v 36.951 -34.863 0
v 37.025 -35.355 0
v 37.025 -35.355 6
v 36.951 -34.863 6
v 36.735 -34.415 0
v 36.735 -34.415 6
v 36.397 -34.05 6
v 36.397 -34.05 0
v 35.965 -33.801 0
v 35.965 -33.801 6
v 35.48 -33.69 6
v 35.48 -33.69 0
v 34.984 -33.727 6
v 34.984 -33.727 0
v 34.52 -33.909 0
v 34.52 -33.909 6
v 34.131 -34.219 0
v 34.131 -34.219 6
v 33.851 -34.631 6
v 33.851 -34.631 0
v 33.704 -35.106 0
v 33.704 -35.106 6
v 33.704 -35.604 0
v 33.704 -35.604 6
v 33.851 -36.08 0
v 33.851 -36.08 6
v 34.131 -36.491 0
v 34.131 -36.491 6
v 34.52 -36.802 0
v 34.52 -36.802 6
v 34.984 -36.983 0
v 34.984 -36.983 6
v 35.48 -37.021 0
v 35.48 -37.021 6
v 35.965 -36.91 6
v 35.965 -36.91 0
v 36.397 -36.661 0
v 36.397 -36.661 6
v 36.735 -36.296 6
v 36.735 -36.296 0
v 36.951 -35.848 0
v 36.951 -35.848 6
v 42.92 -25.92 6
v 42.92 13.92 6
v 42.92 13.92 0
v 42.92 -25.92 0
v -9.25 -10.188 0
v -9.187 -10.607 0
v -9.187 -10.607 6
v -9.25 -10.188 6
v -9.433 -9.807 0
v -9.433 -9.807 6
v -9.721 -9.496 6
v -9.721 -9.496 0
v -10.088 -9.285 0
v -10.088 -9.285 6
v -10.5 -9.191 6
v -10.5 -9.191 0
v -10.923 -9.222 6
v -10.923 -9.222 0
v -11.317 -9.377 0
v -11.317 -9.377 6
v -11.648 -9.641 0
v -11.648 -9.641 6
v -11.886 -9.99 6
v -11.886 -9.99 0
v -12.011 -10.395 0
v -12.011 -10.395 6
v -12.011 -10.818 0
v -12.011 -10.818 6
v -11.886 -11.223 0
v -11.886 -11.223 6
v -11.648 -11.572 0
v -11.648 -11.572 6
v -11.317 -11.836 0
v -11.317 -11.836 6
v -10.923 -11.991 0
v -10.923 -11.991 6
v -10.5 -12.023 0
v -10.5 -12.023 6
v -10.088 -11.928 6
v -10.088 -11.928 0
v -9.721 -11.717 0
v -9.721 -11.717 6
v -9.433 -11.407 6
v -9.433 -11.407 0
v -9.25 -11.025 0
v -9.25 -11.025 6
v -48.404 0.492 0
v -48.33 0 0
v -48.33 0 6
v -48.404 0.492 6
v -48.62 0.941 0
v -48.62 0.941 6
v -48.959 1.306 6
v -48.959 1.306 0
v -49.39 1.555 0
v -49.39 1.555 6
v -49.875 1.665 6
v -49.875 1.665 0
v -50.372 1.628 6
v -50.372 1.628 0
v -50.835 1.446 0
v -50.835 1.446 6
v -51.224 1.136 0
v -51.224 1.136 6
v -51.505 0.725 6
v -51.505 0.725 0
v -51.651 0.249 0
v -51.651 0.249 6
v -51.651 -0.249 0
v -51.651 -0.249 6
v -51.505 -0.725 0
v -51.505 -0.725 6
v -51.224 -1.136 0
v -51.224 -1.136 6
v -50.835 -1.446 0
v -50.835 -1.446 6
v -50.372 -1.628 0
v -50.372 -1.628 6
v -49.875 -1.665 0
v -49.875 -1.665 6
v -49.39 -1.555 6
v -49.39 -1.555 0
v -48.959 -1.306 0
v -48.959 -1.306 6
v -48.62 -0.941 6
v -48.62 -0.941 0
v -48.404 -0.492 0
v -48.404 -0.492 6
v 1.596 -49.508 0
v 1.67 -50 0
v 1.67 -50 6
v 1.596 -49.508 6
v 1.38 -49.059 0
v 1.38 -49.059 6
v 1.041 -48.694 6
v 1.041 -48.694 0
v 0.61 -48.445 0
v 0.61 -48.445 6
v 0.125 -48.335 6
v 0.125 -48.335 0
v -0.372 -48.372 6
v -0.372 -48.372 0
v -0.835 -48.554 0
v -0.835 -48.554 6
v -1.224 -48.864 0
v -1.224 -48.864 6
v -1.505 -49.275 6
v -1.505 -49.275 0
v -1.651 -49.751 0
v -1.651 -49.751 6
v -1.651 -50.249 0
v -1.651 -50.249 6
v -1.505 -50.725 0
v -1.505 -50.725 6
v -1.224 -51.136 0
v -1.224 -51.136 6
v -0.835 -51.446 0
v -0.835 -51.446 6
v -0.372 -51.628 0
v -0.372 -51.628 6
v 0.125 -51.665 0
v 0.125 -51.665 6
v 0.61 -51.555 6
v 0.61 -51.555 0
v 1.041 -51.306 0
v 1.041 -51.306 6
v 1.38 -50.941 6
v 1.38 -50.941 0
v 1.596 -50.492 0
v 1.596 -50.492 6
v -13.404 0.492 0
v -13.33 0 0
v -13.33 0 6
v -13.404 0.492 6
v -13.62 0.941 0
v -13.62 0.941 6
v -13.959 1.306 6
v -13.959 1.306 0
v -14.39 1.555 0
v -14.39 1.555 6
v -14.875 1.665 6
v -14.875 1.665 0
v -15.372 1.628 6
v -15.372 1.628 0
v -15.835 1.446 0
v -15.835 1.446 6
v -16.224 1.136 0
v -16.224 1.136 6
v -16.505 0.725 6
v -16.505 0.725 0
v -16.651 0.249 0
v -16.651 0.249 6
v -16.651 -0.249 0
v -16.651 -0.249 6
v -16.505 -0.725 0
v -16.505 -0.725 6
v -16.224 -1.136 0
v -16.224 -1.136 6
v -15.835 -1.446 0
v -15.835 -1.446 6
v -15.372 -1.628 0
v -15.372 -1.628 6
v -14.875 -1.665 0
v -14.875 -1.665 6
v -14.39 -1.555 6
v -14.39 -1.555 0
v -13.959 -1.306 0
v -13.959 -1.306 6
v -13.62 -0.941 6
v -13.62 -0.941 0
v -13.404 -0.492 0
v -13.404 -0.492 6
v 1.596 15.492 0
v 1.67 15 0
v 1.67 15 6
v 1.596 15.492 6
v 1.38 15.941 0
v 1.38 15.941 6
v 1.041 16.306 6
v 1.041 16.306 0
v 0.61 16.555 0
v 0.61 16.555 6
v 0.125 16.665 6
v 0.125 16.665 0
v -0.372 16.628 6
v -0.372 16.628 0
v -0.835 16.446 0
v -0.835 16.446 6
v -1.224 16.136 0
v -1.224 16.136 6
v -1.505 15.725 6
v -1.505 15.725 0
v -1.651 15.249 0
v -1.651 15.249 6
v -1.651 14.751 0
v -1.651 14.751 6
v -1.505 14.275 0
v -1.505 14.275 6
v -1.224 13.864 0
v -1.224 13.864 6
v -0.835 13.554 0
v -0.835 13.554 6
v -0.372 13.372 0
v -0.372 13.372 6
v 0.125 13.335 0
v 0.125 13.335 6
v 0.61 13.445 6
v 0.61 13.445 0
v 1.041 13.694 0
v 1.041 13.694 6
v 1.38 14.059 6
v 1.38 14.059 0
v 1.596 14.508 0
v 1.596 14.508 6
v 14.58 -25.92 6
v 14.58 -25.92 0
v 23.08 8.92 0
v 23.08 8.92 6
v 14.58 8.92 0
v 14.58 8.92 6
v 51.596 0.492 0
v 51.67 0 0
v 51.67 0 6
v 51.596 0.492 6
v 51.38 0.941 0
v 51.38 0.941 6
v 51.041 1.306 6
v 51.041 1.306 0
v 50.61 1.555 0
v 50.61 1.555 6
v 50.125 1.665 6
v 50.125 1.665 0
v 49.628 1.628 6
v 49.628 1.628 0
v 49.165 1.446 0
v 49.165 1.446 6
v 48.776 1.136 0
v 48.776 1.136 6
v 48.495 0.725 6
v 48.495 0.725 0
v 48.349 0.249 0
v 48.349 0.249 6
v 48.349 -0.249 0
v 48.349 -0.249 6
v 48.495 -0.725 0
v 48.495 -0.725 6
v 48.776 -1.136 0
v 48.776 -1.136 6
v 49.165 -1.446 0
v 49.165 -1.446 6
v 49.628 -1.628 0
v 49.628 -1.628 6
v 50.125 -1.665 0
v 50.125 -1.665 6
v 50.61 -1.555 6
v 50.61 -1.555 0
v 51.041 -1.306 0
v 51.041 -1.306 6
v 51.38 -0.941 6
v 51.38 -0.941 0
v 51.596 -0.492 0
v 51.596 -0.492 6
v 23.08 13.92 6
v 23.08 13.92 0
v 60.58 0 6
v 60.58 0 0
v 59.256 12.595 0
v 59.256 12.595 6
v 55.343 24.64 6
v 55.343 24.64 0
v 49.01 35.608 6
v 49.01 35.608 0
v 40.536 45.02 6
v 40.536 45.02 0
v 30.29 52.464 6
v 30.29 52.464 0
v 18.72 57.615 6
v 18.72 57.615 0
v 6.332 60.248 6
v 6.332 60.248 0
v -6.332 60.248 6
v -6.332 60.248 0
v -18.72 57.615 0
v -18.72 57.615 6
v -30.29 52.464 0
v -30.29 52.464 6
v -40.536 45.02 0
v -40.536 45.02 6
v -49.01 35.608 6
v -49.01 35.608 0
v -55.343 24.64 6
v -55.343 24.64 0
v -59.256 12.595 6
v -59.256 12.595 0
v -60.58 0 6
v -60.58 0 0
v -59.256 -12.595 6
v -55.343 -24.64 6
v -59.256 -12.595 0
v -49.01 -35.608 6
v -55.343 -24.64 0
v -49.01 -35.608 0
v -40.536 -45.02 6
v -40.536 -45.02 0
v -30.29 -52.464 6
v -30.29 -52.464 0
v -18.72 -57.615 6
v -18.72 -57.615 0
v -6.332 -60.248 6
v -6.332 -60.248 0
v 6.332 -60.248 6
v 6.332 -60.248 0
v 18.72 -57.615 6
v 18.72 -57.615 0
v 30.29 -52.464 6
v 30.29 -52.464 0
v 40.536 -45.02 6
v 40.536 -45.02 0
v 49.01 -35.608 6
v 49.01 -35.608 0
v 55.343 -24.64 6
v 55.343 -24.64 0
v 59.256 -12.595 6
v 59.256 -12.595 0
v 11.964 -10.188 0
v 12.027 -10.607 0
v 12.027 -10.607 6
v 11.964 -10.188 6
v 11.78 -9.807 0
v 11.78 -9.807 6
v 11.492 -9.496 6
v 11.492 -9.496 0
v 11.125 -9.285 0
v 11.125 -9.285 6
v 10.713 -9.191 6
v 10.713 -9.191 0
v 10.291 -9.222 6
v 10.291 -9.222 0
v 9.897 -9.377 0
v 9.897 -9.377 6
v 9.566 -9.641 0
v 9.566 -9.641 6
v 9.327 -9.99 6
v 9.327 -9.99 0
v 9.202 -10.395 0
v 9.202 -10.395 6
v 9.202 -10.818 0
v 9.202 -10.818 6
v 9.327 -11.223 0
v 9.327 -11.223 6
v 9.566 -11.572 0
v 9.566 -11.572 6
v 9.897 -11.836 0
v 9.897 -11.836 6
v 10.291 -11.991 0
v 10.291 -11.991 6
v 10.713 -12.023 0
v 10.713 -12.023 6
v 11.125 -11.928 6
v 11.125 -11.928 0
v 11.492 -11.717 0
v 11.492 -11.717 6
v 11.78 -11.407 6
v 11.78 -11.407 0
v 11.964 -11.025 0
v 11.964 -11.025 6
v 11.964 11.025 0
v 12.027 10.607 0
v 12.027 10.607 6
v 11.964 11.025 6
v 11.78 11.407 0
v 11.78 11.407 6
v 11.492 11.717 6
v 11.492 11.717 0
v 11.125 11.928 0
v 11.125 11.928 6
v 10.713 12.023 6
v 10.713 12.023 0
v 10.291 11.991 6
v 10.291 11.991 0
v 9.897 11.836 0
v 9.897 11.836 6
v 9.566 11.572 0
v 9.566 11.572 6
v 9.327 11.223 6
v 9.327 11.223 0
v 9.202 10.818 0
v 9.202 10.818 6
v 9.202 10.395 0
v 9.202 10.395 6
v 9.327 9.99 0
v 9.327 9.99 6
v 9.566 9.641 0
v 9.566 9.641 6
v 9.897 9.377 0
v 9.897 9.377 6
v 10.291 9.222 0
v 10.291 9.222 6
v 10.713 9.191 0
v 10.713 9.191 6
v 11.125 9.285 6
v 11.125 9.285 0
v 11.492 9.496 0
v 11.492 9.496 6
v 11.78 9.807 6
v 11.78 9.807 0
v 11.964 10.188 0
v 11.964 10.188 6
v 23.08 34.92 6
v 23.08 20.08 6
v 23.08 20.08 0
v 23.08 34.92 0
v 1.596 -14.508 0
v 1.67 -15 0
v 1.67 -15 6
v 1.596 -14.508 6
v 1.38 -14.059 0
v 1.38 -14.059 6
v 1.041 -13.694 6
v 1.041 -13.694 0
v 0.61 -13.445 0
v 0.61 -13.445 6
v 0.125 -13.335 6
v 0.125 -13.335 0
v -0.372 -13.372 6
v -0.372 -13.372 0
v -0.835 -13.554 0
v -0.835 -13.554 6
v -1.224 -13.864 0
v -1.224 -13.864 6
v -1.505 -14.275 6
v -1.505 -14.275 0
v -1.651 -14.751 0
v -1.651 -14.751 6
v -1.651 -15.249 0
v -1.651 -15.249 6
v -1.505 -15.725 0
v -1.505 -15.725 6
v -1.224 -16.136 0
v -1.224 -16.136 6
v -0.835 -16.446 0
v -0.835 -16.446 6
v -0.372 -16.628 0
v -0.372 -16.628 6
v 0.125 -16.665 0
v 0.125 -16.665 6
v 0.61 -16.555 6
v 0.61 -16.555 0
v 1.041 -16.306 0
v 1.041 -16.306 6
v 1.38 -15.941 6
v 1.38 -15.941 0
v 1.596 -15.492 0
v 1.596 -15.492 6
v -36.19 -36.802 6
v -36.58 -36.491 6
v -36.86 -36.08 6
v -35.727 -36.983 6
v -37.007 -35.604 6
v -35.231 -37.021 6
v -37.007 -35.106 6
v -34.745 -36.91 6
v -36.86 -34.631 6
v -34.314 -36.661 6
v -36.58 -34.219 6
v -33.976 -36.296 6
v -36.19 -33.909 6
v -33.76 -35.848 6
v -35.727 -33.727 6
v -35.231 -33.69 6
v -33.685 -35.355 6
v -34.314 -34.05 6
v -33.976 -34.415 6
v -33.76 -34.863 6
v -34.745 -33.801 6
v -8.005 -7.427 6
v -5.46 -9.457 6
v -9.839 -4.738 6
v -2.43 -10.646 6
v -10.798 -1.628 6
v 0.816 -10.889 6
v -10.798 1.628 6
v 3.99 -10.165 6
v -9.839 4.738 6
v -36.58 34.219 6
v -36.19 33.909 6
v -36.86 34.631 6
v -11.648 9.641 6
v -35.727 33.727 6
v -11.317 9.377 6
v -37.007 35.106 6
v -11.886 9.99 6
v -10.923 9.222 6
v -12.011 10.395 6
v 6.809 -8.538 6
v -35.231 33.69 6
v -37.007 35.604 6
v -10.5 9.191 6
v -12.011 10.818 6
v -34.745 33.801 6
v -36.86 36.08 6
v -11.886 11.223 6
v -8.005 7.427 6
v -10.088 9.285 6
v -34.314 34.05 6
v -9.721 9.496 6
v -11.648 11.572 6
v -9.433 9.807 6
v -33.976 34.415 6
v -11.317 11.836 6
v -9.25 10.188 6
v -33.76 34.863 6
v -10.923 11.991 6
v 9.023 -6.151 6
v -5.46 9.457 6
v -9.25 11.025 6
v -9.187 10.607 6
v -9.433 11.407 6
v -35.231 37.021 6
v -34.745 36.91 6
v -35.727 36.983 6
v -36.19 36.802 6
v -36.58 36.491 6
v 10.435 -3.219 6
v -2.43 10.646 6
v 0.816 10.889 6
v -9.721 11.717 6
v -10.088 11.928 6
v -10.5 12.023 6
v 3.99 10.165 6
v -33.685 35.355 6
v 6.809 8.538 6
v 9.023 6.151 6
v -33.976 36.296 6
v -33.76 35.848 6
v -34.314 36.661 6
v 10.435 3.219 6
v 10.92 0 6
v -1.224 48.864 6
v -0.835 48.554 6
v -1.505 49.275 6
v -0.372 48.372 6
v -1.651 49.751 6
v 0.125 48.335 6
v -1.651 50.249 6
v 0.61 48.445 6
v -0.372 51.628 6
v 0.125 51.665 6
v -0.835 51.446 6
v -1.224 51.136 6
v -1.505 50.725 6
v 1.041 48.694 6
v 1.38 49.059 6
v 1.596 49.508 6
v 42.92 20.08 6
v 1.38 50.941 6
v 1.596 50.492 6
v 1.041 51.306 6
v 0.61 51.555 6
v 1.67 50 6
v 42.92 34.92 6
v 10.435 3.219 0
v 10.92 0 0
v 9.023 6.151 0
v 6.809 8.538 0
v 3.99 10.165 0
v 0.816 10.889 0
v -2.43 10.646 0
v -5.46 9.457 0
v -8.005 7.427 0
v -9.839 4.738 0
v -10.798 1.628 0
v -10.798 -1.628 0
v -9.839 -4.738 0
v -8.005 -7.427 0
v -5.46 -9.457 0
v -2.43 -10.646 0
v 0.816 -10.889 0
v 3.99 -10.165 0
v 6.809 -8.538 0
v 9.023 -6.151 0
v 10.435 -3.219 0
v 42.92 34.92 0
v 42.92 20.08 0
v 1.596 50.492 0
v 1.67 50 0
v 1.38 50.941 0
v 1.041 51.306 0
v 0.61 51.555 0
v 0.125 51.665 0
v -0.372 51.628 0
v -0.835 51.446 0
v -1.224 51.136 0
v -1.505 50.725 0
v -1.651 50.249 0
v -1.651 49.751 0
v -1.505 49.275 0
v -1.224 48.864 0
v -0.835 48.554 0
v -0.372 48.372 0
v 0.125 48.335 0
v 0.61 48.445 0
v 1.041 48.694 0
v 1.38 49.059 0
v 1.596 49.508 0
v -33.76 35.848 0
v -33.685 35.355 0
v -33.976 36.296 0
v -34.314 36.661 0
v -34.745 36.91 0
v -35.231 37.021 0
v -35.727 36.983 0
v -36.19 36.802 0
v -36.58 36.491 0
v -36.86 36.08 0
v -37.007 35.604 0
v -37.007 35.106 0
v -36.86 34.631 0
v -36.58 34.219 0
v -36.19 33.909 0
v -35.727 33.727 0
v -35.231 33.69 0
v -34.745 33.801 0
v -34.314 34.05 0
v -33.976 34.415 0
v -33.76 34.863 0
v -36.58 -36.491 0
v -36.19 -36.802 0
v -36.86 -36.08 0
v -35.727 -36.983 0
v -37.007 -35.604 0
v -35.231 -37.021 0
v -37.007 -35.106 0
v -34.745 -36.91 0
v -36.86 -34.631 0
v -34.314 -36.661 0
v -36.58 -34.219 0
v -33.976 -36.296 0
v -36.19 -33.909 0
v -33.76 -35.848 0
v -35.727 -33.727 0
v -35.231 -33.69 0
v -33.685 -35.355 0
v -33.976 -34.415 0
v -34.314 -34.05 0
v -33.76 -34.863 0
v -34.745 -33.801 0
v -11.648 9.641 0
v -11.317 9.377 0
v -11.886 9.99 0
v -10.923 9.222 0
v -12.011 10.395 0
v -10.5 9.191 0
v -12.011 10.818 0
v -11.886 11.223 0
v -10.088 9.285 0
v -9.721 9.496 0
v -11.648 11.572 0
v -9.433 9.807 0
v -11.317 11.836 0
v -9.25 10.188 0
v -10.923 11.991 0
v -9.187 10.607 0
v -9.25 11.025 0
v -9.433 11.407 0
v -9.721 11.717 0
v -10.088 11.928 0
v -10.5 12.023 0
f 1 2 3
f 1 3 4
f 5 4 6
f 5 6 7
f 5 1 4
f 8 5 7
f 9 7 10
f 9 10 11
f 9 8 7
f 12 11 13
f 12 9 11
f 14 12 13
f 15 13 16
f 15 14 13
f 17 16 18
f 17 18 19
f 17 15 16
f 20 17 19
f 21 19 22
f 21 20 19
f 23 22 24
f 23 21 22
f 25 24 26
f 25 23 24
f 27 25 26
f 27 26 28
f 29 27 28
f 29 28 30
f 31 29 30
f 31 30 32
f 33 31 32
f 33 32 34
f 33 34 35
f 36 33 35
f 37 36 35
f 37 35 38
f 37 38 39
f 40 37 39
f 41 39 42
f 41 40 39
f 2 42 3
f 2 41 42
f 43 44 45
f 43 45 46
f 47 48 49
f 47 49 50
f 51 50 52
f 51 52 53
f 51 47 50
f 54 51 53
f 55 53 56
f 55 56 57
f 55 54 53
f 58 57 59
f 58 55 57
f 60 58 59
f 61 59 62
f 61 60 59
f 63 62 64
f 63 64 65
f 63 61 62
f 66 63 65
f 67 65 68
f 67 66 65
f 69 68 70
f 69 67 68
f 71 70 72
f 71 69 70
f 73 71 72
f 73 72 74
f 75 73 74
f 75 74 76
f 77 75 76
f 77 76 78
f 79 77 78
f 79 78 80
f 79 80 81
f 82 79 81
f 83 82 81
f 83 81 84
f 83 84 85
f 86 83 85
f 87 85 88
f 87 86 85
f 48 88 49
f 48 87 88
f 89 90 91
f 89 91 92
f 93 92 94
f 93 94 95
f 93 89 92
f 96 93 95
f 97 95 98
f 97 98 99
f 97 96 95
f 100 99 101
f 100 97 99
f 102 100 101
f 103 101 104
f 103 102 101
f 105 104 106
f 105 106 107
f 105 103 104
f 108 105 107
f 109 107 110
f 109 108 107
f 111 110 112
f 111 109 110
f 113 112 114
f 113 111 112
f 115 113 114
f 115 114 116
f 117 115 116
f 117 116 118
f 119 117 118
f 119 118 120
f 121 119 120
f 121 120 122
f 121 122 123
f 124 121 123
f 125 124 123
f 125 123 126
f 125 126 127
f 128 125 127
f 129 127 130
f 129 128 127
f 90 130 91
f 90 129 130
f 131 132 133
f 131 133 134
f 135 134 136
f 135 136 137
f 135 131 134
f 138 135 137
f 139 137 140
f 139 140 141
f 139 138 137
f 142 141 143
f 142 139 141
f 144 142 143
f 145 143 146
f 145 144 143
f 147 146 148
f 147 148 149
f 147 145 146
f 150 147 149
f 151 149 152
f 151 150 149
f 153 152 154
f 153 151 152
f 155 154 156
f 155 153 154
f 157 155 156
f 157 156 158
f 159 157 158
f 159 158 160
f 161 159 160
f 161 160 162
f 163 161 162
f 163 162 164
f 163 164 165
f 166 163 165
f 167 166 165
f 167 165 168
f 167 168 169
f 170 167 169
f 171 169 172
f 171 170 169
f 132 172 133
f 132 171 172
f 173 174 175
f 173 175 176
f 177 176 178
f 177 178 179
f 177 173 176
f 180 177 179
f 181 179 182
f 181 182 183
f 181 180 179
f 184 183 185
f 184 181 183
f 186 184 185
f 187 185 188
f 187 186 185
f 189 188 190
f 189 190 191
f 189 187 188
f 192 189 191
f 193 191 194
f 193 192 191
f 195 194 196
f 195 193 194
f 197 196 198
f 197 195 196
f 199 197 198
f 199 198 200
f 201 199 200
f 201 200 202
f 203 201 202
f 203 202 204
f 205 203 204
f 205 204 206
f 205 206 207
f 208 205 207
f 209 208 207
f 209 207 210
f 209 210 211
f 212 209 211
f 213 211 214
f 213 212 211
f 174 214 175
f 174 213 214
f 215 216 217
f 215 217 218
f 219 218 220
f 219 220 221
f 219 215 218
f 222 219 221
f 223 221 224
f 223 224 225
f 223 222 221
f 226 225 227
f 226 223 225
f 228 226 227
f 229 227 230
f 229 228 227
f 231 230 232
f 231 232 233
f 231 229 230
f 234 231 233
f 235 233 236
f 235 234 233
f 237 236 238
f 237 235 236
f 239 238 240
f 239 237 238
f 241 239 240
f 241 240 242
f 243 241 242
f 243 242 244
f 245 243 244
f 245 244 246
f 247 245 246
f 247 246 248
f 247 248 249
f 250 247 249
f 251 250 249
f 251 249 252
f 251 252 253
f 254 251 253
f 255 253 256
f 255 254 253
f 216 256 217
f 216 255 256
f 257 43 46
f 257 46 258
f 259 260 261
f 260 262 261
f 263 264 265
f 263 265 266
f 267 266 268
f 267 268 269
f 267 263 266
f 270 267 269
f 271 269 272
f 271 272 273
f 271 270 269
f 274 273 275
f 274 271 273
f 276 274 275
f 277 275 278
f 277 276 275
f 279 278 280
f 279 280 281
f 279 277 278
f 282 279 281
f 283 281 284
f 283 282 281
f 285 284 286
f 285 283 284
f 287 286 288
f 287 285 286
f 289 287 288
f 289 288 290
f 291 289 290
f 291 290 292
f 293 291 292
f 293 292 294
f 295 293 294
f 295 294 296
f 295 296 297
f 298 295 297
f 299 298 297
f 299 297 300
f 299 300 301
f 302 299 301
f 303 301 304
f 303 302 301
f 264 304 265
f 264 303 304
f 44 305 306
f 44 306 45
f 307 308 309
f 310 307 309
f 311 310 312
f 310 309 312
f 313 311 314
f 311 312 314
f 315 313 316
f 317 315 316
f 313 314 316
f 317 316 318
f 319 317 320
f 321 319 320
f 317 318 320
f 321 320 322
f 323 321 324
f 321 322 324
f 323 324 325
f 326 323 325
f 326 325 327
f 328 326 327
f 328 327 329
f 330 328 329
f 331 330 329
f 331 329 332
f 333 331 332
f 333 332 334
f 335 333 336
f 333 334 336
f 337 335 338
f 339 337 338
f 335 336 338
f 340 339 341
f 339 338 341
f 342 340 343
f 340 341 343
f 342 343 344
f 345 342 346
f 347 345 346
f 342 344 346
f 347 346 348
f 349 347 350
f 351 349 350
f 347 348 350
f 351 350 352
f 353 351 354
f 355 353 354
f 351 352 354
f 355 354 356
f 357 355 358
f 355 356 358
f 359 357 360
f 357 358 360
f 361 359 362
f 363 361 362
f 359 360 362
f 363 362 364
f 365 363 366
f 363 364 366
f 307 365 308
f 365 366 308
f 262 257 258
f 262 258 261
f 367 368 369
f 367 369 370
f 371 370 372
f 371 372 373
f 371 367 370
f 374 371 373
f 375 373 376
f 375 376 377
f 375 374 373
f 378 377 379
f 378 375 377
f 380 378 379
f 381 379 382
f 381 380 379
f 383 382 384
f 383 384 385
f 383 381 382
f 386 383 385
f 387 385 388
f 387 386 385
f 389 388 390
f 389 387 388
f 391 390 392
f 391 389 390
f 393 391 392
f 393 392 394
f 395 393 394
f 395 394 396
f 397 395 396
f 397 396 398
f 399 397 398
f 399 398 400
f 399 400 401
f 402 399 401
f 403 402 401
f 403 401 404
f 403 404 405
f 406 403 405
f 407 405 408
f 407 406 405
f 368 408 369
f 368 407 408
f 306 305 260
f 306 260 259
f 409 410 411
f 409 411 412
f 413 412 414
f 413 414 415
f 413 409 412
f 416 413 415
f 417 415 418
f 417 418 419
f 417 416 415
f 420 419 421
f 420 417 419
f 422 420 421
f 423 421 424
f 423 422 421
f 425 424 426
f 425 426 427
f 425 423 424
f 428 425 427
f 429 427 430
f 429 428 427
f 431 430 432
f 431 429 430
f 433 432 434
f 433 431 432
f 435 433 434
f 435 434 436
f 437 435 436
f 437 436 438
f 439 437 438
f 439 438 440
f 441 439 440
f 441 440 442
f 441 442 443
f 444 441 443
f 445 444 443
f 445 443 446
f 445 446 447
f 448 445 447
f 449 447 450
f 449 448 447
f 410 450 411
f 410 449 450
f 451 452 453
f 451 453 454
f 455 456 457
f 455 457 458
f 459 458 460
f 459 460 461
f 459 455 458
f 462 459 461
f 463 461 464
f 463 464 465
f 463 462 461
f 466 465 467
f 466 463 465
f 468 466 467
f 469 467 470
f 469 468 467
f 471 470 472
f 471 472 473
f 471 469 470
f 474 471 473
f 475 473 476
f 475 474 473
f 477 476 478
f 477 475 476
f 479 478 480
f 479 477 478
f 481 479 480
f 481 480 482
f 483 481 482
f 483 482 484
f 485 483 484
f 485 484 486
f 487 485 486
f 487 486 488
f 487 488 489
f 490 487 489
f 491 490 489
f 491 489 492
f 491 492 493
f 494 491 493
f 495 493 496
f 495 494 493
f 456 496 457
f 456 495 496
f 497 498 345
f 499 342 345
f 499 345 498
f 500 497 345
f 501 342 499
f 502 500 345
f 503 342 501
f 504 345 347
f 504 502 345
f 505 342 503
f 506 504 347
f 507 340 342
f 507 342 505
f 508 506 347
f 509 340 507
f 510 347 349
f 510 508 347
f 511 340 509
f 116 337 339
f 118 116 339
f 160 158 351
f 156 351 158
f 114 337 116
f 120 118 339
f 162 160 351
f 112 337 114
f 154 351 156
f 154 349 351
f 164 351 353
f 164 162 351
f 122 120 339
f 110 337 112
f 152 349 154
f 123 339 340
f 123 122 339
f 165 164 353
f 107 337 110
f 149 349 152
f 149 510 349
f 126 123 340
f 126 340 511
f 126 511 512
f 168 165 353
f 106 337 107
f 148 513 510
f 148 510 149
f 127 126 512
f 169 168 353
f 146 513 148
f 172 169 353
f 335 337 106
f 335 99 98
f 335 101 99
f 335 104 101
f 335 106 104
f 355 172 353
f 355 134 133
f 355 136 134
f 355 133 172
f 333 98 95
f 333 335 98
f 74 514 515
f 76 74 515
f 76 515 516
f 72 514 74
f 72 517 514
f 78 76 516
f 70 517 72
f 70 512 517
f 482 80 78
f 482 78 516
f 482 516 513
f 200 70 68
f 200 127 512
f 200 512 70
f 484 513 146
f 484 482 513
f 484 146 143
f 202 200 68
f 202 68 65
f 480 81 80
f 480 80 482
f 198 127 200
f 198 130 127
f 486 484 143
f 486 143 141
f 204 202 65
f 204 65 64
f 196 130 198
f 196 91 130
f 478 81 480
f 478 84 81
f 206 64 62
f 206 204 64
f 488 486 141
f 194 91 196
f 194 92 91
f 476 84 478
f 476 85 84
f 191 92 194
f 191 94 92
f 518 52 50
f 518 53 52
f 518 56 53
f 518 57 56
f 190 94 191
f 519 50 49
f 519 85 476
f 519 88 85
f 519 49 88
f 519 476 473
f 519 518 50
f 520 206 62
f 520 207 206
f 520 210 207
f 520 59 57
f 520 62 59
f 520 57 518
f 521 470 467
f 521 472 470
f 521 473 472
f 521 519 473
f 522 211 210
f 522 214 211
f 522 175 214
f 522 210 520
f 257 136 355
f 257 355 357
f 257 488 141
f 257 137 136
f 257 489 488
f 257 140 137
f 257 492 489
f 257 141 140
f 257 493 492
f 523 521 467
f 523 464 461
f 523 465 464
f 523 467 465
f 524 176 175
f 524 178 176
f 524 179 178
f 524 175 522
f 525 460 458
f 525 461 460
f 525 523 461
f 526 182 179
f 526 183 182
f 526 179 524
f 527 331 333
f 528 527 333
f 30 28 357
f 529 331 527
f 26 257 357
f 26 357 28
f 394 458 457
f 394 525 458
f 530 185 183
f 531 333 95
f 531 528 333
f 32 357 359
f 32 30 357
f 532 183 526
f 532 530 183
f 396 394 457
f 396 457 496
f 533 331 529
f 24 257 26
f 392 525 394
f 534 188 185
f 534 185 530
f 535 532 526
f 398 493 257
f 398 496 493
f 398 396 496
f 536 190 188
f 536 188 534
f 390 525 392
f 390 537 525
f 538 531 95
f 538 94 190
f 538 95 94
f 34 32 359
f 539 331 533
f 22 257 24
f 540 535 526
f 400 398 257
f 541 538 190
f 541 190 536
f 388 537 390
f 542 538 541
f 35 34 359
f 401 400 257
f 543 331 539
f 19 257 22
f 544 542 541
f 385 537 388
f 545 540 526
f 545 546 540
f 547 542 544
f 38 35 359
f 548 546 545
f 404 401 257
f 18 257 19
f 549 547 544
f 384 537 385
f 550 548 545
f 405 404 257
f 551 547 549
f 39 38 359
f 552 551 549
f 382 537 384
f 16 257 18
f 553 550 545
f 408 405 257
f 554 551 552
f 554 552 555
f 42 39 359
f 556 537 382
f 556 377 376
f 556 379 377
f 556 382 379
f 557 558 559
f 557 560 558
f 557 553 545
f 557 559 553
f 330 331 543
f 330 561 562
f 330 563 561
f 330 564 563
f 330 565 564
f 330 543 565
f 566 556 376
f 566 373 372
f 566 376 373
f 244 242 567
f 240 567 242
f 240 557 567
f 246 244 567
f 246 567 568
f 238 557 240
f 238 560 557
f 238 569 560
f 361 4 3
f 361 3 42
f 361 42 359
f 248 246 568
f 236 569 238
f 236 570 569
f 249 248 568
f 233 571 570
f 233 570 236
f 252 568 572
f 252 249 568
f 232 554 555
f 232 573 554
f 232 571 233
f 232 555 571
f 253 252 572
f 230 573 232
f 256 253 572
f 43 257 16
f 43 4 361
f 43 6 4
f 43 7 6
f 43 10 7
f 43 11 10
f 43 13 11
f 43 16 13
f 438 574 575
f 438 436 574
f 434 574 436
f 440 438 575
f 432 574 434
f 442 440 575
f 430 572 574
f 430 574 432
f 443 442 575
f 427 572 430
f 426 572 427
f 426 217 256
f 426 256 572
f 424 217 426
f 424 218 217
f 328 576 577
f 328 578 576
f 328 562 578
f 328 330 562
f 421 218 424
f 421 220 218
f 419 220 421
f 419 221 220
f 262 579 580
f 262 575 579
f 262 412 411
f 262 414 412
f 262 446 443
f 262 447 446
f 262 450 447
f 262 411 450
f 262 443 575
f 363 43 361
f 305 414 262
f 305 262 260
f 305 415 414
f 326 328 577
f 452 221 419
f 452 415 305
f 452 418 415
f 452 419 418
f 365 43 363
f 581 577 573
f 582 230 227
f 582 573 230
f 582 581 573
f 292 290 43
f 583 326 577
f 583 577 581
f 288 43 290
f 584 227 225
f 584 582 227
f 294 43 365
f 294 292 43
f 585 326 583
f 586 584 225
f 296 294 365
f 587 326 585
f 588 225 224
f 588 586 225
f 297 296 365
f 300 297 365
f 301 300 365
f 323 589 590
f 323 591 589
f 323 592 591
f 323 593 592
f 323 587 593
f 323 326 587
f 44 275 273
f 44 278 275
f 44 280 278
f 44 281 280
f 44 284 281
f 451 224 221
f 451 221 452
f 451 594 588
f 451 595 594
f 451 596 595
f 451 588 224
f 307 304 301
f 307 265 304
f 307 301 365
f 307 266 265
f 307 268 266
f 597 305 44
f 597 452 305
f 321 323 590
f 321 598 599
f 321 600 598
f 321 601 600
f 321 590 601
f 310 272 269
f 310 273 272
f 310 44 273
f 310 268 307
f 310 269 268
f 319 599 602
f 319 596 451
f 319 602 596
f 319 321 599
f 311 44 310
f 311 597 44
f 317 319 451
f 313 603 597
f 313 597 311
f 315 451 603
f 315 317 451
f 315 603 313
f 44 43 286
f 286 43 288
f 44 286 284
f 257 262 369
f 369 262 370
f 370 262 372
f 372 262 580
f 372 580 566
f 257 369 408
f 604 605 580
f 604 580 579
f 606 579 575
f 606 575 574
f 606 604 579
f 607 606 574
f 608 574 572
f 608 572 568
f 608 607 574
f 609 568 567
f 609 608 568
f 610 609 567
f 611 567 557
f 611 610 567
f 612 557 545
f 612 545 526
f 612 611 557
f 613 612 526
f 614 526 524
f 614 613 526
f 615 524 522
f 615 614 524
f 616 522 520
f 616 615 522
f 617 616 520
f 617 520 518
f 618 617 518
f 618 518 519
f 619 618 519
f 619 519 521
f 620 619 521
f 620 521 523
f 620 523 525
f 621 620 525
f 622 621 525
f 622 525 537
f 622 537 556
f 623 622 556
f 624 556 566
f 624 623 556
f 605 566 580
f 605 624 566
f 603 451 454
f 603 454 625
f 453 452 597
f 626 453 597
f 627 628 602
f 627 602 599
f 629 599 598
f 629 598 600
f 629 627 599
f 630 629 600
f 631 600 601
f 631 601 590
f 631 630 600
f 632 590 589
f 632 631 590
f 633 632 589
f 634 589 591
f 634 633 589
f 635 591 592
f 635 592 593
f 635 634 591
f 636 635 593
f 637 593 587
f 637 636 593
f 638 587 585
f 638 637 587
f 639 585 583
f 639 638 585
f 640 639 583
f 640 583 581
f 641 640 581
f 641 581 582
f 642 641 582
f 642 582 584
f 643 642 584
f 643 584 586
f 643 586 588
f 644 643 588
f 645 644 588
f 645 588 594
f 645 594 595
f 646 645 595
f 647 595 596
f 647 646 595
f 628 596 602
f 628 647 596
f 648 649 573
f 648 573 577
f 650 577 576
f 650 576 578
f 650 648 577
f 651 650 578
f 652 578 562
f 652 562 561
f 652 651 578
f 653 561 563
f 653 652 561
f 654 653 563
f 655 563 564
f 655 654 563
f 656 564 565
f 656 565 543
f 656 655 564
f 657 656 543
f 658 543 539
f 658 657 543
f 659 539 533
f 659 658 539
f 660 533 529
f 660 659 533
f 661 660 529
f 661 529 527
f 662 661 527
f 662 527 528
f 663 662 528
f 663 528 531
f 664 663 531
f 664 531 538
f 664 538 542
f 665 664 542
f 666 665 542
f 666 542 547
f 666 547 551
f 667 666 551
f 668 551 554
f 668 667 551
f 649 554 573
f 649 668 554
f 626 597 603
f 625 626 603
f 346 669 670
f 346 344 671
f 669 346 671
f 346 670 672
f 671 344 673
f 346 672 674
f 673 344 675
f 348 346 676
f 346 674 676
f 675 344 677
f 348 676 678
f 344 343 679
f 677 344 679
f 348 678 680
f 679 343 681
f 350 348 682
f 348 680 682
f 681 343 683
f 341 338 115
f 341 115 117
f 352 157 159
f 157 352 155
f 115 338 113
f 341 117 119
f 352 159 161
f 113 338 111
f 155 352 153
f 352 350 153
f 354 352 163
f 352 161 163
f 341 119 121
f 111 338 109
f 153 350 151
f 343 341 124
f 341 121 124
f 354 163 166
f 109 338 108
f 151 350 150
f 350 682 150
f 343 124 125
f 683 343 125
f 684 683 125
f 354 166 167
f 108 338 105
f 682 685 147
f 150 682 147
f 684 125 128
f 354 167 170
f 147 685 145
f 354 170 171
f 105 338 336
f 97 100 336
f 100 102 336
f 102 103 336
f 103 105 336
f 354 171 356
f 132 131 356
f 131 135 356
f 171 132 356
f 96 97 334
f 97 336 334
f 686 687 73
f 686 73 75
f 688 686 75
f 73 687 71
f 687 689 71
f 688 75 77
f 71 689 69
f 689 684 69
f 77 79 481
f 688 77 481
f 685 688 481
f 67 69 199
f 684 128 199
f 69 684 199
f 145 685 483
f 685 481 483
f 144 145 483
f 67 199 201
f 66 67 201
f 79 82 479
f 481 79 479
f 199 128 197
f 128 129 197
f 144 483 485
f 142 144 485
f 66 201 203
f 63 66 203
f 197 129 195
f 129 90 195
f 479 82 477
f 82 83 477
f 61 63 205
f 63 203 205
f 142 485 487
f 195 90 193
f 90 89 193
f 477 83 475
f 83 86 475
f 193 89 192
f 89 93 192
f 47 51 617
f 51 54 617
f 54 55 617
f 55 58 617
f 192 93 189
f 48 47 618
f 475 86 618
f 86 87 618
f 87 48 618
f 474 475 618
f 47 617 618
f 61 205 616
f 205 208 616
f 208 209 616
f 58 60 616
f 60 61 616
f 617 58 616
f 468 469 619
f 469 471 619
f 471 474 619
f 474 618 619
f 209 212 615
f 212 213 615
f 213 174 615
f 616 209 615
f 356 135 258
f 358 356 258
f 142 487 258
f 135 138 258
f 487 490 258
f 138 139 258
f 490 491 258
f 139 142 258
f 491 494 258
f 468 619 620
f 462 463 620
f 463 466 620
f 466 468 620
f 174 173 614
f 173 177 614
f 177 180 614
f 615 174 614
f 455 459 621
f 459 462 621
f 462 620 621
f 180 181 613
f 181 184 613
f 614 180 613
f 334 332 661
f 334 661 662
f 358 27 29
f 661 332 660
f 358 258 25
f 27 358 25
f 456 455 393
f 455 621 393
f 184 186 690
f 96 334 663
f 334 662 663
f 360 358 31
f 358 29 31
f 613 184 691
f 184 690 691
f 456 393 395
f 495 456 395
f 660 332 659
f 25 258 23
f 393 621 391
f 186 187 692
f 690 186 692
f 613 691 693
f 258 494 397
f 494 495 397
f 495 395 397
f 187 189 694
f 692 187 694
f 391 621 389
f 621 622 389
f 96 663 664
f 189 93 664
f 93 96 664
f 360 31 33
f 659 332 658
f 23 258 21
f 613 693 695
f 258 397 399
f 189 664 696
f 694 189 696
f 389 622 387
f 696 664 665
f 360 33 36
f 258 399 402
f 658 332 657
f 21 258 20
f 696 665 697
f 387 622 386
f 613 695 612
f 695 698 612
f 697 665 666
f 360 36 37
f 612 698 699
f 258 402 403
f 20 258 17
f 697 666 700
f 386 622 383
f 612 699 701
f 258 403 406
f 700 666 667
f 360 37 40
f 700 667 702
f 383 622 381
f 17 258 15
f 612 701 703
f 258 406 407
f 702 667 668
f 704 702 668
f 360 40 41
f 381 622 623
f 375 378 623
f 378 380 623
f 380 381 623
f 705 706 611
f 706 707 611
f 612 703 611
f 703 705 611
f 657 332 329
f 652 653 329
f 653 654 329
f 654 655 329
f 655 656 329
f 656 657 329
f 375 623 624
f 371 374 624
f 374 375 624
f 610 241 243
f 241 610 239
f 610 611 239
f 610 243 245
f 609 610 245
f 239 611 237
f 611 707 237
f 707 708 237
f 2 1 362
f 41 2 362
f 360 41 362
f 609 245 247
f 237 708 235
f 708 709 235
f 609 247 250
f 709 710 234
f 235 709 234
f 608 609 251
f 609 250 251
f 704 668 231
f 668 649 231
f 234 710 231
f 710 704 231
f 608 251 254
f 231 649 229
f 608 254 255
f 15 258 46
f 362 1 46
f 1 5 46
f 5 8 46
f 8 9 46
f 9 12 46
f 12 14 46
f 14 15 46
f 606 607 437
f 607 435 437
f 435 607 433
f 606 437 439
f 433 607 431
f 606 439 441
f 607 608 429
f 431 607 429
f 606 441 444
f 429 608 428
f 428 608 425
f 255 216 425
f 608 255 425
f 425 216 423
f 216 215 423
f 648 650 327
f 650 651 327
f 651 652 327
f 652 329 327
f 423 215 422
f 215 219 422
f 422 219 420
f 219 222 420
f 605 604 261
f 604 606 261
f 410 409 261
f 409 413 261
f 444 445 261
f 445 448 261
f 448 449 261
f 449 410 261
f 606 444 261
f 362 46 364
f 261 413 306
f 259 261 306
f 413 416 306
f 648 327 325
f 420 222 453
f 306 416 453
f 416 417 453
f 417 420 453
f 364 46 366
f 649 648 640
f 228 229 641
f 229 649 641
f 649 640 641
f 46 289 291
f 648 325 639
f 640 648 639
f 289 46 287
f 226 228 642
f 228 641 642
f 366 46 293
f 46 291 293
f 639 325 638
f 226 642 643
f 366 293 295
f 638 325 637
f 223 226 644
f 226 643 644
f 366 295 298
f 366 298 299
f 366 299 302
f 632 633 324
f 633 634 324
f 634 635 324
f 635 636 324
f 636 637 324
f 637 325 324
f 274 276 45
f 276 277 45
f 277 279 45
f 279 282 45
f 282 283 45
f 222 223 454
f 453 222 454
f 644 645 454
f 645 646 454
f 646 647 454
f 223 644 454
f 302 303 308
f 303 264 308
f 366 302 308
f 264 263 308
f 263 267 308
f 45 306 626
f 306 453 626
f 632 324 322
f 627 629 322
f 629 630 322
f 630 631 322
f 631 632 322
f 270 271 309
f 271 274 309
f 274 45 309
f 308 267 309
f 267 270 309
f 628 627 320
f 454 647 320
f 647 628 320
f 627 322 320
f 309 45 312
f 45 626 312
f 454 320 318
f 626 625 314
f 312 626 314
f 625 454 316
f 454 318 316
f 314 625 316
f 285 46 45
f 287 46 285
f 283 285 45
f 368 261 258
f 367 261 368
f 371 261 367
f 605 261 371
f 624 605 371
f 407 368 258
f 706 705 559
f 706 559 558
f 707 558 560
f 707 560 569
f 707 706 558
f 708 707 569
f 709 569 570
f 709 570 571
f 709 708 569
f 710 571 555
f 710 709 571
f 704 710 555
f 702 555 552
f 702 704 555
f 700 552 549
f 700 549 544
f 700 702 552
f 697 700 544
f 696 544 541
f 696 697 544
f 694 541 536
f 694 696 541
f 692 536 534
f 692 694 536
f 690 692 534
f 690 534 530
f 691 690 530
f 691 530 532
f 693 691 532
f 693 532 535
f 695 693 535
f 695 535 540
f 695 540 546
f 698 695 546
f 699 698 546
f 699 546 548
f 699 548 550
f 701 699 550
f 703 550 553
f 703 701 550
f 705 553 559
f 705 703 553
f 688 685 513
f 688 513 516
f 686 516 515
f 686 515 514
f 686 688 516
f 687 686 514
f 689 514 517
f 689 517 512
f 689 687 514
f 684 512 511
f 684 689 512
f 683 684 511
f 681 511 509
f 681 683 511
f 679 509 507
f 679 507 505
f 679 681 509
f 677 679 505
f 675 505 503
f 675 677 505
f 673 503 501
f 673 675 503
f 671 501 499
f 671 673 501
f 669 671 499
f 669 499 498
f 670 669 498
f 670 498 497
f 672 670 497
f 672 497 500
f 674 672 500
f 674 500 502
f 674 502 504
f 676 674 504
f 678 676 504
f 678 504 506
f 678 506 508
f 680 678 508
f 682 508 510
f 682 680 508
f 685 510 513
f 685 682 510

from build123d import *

# Parameters (mm, degrees)
SKETCH1_R           = 60.5
SKETCH1_R_2         = 11
SKETCH1_R_3         = 1.75
SKETCH1_R_4         = 1.5
BOSS_EXTRUDE1_DEPTH = 6
SKETCH2_W           = 20
SKETCH2_H           = 15
CUT_EXTRUDE1_DEPTH  = 86.77004139
MOVE_FACE1_BY       = 0.08
MOVE_FACE1_2_BY     = 0.08
MOVE_FACE1_3_BY     = 0.08
MOVE_FACE1_4_BY     = 0.08
MOVE_FACE1_5_BY     = 0.08
MOVE_FACE1_6_BY     = 0.08
MOVE_FACE1_7_BY     = 0.08
MOVE_FACE1_8_BY     = 0.08
MOVE_FACE1_9_BY     = 0.08
MOVE_FACE1_10_BY    = 0.08
MOVE_FACE1_11_BY    = 0.08
MOVE_FACE1_12_BY    = 0.08
MOVE_FACE1_13_BY    = 0.08
MOVE_FACE1_14_BY    = 0.08
MOVE_FACE1_15_BY    = 0.08
MOVE_FACE1_16_BY    = 0.08
MOVE_FACE1_17_BY    = 0.08
MOVE_FACE1_18_BY    = 0.08
MOVE_FACE1_19_BY    = 0.08
MOVE_FACE1_20_BY    = 0.08
MOVE_FACE1_21_BY    = 0.08
MOVE_FACE1_22_BY    = 0.08
MOVE_FACE1_23_BY    = 0.08
MOVE_FACE1_24_BY    = 0.08
MOVE_FACE1_25_BY    = 0.08
MOVE_FACE1_26_BY    = 0.08


with BuildPart() as part:
    # Sketch1 → Boss-Extrude1 (new body)
    with BuildSketch(Plane.XY):
        Circle(SKETCH1_R)
        Circle(SKETCH1_R_2, mode=Mode.SUBTRACT)
        with Locations((0, -15)):
            Circle(SKETCH1_R_3, mode=Mode.SUBTRACT)
        with Locations((10.606601718, -10.606601718)):
            Circle(SKETCH1_R_4, mode=Mode.SUBTRACT)
        with Locations((0, -50)):
            Circle(SKETCH1_R_3, mode=Mode.SUBTRACT)
        with Locations((-15, 0)):
            Circle(SKETCH1_R_3, mode=Mode.SUBTRACT)
        with Locations((-10.606601718, -10.606601718)):
            Circle(SKETCH1_R_4, mode=Mode.SUBTRACT)
        with Locations((0, 15)):
            Circle(SKETCH1_R_3, mode=Mode.SUBTRACT)
        with Locations((-10.606601718, 10.606601718)):
            Circle(SKETCH1_R_4, mode=Mode.SUBTRACT)
        with Locations((10.606601718, 10.606601718)):
            Circle(SKETCH1_R_4, mode=Mode.SUBTRACT)
        with Locations((-35.355339059, -35.355339059)):
            Circle(SKETCH1_R_3, mode=Mode.SUBTRACT)
        with Locations((-50, 0)):
            Circle(SKETCH1_R_3, mode=Mode.SUBTRACT)
        with Locations((-35.355339059, 35.355339059)):
            Circle(SKETCH1_R_3, mode=Mode.SUBTRACT)
        with Locations((0, 50)):
            Circle(SKETCH1_R_3, mode=Mode.SUBTRACT)
        with Locations((50, 0)):
            Circle(SKETCH1_R_3, mode=Mode.SUBTRACT)
        with Locations((35.355339059, -35.355339059)):
            Circle(SKETCH1_R_3, mode=Mode.SUBTRACT)
    extrude(amount=BOSS_EXTRUDE1_DEPTH)

    # Sketch2 → Cut-Extrude1 (cut, through all)
    with BuildSketch(Plane.XY.offset(6)):
        Polygon((23, 14), (43, 14), (43, -26), (14.5, -26), (14.5, 9), (23, 9), align=None)
        with Locations((33, 27.5)):
            Rectangle(SKETCH2_W, SKETCH2_H)
    extrude(amount=-CUT_EXTRUDE1_DEPTH, mode=Mode.SUBTRACT)

    # Move Face1: a face moved outward by 0.08
    extrude(part.faces().sort_by_distance((23, 27.5, 3))[0], amount=MOVE_FACE1_BY, dir=(1, 0, 0))

    # Move Face1 2: a curved face moved outward by 0.08
    add(Solid.thicken(part.faces().sort_by_distance((-11, 0, 3))[0], MOVE_FACE1_2_BY))

    # Move Face1 3: a curved face moved outward by 0.08
    add(Solid.thicken(part.faces().sort_by_distance((-60.5, 0, 3))[0], MOVE_FACE1_3_BY))

    # Move Face1 4: a curved face moved outward by 0.08
    add(Solid.thicken(part.faces().sort_by_distance((-1.75, -15, 3))[0], MOVE_FACE1_4_BY))

    # Move Face1 5: a curved face moved outward by 0.08
    add(Solid.thicken(part.faces().sort_by_distance((9.106601718, -10.606601718, 3))[0], MOVE_FACE1_5_BY))

    # Move Face1 6: a curved face moved outward by 0.08
    add(Solid.thicken(part.faces().sort_by_distance((-1.75, -50, 3))[0], MOVE_FACE1_6_BY))

    # Move Face1 7: a curved face moved outward by 0.08
    add(Solid.thicken(part.faces().sort_by_distance((-16.75, 0, 3))[0], MOVE_FACE1_7_BY))

    # Move Face1 8: a curved face moved outward by 0.08
    add(Solid.thicken(part.faces().sort_by_distance((-12.106601718, -10.606601718, 3))[0], MOVE_FACE1_8_BY))

    # Move Face1 9: a curved face moved outward by 0.08
    add(Solid.thicken(part.faces().sort_by_distance((-1.75, 15, 3))[0], MOVE_FACE1_9_BY))

    # Move Face1 10: a curved face moved outward by 0.08
    add(Solid.thicken(part.faces().sort_by_distance((-12.106601718, 10.606601718, 3))[0], MOVE_FACE1_10_BY))

    # Move Face1 11: a curved face moved outward by 0.08
    add(Solid.thicken(part.faces().sort_by_distance((9.106601718, 10.606601718, 3))[0], MOVE_FACE1_11_BY))

    # Move Face1 12: a curved face moved outward by 0.08
    add(Solid.thicken(part.faces().sort_by_distance((-37.105339059, -35.355339059, 3))[0], MOVE_FACE1_12_BY))

    # Move Face1 13: a curved face moved outward by 0.08
    add(Solid.thicken(part.faces().sort_by_distance((-51.75, 0, 3))[0], MOVE_FACE1_13_BY))

    # Move Face1 14: a curved face moved outward by 0.08
    add(Solid.thicken(part.faces().sort_by_distance((-37.105339059, 35.355339059, 3))[0], MOVE_FACE1_14_BY))

    # Move Face1 15: a curved face moved outward by 0.08
    add(Solid.thicken(part.faces().sort_by_distance((-1.75, 50, 3))[0], MOVE_FACE1_15_BY))

    # Move Face1 16: a curved face moved outward by 0.08
    add(Solid.thicken(part.faces().sort_by_distance((48.25, 0, 3))[0], MOVE_FACE1_16_BY))

    # Move Face1 17: a curved face moved outward by 0.08
    add(Solid.thicken(part.faces().sort_by_distance((33.605339059, -35.355339059, 3))[0], MOVE_FACE1_17_BY))

    # Move Face1 18: a face moved outward by 0.08
    extrude(part.faces().sort_by_distance((18.75, 9, 3))[0], amount=MOVE_FACE1_18_BY, dir=(0, -1, 0))

    # Move Face1 19: a face moved outward by 0.08
    extrude(part.faces().sort_by_distance((14.5, -8.5, 3))[0], amount=MOVE_FACE1_19_BY, dir=(1, 0, 0))

    # Move Face1 20: a face moved outward by 0.08
    extrude(part.faces().sort_by_distance((28.75, -26, 3))[0], amount=MOVE_FACE1_20_BY, dir=(0, 1, 0))

    # Move Face1 21: a face moved outward by 0.08
    extrude(part.faces().sort_by_distance((43, -6, 3))[0], amount=MOVE_FACE1_21_BY, dir=(-1, 0, 0))

    # Move Face1 22: a face moved outward by 0.08
    extrude(part.faces().sort_by_distance((33, 14, 3))[0], amount=MOVE_FACE1_22_BY, dir=(0, -1, 0))

    # Move Face1 23: a face moved outward by 0.08
    extrude(part.faces().sort_by_distance((23, 11.5, 3))[0], amount=MOVE_FACE1_23_BY, dir=(1, 0, 0))

    # Move Face1 24: a face moved outward by 0.08
    extrude(part.faces().sort_by_distance((33, 20, 3))[0], amount=MOVE_FACE1_24_BY, dir=(0, 1, 0))

    # Move Face1 25: a face moved outward by 0.08
    extrude(part.faces().sort_by_distance((43, 27.5, 3))[0], amount=MOVE_FACE1_25_BY, dir=(-1, 0, 0))

    # Move Face1 26: a face moved outward by 0.08
    extrude(part.faces().sort_by_distance((33, 35, 3))[0], amount=MOVE_FACE1_26_BY, dir=(0, -1, 0))


solid = part.part
